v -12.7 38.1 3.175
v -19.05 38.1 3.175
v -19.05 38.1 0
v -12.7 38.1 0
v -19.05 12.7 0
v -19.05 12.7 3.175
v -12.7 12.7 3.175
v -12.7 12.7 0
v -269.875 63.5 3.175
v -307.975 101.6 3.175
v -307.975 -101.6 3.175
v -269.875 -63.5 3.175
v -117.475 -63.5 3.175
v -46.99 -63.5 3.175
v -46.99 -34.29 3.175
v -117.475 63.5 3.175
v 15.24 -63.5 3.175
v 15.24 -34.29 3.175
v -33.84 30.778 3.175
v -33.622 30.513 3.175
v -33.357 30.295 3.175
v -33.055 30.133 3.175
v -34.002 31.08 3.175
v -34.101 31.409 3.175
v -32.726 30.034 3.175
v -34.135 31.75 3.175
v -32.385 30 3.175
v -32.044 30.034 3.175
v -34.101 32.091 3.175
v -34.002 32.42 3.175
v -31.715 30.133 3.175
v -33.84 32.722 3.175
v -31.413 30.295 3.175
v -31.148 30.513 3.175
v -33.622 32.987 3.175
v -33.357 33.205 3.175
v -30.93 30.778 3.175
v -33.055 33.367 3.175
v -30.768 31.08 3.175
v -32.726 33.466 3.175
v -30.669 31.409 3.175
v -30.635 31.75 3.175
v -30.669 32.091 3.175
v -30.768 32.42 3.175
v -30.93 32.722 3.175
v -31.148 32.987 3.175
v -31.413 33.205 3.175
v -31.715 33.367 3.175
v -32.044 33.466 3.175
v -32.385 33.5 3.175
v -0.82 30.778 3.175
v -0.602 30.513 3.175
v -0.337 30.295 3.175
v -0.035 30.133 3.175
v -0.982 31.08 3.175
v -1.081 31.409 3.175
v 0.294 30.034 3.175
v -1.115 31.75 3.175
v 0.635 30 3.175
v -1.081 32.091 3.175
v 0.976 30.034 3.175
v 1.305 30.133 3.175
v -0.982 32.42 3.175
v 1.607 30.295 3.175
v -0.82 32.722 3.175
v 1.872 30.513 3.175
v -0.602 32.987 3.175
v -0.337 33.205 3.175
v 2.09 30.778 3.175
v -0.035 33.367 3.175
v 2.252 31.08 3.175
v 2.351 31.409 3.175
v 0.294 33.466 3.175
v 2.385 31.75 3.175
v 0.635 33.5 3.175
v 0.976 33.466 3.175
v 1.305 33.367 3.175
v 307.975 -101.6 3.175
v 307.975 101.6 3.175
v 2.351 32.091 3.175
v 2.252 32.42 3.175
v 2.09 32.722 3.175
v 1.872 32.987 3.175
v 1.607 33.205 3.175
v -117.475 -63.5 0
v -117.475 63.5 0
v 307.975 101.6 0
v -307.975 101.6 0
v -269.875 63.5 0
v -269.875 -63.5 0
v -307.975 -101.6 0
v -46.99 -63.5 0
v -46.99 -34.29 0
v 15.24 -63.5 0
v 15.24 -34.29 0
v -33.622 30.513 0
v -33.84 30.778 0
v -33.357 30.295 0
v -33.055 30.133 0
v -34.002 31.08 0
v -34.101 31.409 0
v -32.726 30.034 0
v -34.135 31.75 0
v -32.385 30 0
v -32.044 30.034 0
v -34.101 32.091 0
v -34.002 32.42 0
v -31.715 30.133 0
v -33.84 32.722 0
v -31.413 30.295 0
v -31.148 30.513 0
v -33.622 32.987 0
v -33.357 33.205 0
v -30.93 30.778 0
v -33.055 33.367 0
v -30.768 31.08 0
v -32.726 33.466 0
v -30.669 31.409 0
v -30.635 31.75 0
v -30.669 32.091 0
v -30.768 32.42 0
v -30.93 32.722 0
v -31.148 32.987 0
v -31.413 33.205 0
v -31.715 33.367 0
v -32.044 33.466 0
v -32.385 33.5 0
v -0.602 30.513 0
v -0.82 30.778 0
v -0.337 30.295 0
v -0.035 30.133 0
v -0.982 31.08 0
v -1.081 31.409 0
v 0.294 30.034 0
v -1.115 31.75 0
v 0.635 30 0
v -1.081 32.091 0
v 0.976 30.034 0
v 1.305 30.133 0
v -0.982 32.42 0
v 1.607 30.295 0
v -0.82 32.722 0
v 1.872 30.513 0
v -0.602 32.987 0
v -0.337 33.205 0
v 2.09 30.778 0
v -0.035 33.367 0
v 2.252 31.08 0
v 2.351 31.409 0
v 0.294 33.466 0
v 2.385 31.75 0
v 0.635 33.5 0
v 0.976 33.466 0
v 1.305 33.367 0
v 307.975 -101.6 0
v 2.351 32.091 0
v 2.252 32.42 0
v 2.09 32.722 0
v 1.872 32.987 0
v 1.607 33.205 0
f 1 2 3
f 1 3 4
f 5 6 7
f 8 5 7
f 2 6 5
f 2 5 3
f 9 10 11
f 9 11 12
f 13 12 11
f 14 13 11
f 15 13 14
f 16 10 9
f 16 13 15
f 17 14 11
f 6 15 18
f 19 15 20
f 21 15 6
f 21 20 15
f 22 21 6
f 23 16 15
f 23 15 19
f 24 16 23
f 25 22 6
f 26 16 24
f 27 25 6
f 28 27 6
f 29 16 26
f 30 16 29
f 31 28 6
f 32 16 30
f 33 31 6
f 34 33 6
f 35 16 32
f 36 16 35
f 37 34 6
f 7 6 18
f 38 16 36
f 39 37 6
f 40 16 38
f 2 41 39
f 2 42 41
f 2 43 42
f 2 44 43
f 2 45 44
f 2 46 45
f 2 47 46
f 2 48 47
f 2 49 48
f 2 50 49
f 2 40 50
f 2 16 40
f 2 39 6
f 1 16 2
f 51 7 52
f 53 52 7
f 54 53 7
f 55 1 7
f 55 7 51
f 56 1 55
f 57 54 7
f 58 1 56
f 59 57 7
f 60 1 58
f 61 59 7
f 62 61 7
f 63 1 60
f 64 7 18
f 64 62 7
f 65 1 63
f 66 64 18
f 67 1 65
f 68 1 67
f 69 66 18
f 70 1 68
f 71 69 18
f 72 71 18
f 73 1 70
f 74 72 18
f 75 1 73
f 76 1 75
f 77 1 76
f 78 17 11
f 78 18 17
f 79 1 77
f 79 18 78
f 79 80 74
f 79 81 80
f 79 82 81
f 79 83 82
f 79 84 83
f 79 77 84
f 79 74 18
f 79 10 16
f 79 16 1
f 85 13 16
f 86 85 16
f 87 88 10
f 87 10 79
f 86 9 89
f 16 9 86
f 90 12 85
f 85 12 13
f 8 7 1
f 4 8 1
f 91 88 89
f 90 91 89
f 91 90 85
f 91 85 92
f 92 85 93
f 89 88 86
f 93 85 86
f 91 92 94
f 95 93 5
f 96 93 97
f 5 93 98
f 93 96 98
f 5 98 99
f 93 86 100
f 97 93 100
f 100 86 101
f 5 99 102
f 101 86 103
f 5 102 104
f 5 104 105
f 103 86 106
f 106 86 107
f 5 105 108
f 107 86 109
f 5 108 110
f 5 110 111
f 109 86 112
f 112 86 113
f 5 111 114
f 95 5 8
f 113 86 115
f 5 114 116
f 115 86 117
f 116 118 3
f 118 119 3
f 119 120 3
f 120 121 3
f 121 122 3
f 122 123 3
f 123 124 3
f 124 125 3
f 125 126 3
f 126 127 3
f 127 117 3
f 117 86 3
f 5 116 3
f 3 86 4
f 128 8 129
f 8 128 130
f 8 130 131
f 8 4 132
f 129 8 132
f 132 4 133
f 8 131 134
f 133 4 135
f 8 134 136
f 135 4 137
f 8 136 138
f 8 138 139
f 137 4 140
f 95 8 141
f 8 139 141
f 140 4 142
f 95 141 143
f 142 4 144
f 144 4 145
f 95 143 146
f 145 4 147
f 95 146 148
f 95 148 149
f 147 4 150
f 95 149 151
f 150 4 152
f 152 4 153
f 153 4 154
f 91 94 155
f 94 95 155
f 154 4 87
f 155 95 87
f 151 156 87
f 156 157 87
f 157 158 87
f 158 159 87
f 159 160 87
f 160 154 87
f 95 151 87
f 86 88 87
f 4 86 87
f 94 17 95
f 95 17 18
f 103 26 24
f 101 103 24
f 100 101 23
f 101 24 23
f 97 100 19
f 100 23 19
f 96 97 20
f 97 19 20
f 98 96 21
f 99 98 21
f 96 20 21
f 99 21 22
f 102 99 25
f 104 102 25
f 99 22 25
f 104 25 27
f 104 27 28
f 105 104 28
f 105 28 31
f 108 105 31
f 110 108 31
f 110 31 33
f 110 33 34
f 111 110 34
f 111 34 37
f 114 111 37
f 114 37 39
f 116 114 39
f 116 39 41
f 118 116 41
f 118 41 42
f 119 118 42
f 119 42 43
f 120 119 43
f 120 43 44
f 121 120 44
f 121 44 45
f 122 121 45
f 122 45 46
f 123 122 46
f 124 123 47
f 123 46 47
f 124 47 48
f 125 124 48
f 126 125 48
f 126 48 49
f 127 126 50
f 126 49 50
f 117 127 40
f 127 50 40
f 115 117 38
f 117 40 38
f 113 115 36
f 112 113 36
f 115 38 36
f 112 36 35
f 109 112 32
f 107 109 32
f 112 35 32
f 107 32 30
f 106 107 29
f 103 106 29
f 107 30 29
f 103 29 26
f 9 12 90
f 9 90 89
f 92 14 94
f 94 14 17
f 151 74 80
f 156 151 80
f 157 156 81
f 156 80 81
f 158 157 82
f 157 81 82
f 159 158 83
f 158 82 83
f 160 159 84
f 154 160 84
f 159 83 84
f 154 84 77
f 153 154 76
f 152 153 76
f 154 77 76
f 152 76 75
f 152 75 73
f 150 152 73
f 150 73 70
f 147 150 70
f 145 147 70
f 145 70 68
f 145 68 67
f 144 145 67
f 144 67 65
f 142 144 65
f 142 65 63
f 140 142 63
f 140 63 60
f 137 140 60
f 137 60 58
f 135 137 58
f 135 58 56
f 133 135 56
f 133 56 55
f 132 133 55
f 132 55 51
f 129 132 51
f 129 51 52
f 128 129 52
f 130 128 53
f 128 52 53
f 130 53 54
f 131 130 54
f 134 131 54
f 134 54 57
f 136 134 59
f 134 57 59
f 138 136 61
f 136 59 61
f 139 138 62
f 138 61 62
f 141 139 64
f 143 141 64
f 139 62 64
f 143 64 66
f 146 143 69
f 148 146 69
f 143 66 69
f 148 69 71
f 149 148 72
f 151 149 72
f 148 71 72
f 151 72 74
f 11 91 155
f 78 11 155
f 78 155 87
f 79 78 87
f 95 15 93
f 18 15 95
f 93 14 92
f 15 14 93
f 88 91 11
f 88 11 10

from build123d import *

# Parameters (mm, degrees)
SKETCH1_W           = 615.95
SKETCH1_H           = 203.2
BOSS_EXTRUDE1_DEPTH = 3.175
SKETCH2_W           = 152.4
SKETCH2_H           = 127
CUT_EXTRUDE1_DEPTH  = 325.316575663
SKETCH3_W           = 6.35
SKETCH3_H           = 25.4
CUT_EXTRUDE2_DEPTH  = 325.316575663
SKETCH4_R           = 1.75
CUT_EXTRUDE3_DEPTH  = 325.316575663
SKETCH5_W           = 62.23
SKETCH5_H           = 29.21
CUT_EXTRUDE4_DEPTH  = 325.316575663


with BuildPart() as part:
    # Sketch1 → Boss-Extrude1 (new body)
    with BuildSketch(Plane.XY):
        Rectangle(SKETCH1_W, SKETCH1_H)
    extrude(amount=BOSS_EXTRUDE1_DEPTH)

    # Sketch2 → Cut-Extrude1 (cut, through all)
    with BuildSketch(Plane.XY.offset(3.175)):
        with Locations((-193.675, 0)):
            Rectangle(SKETCH2_W, SKETCH2_H)
    extrude(amount=-CUT_EXTRUDE1_DEPTH, mode=Mode.SUBTRACT)

    # Sketch3 → Cut-Extrude2 (cut, through all)
    with BuildSketch(Plane.XY.offset(3.175)):
        with Locations((-15.875, 25.4)):
            Rectangle(SKETCH3_W, SKETCH3_H)
    extrude(amount=-CUT_EXTRUDE2_DEPTH, mode=Mode.SUBTRACT)

    # Sketch4 → Cut-Extrude3 (cut, through all)
    with BuildSketch(Plane.XY.offset(3.175)):
        with Locations((0.635, 31.75)):
            Circle(SKETCH4_R)
        with Locations(Location((-32.385, 31.75, 0), (0, 0, 180))):
            Circle(SKETCH4_R)
    extrude(amount=-CUT_EXTRUDE3_DEPTH, mode=Mode.SUBTRACT)

    # Sketch5 → Cut-Extrude4 (cut, through all)
    with BuildSketch(Plane.XY.offset(3.175)):
        with Locations((-15.875, -48.895)):
            Rectangle(SKETCH5_W, SKETCH5_H)
    extrude(amount=-CUT_EXTRUDE4_DEPTH, mode=Mode.SUBTRACT)


solid = part.part
